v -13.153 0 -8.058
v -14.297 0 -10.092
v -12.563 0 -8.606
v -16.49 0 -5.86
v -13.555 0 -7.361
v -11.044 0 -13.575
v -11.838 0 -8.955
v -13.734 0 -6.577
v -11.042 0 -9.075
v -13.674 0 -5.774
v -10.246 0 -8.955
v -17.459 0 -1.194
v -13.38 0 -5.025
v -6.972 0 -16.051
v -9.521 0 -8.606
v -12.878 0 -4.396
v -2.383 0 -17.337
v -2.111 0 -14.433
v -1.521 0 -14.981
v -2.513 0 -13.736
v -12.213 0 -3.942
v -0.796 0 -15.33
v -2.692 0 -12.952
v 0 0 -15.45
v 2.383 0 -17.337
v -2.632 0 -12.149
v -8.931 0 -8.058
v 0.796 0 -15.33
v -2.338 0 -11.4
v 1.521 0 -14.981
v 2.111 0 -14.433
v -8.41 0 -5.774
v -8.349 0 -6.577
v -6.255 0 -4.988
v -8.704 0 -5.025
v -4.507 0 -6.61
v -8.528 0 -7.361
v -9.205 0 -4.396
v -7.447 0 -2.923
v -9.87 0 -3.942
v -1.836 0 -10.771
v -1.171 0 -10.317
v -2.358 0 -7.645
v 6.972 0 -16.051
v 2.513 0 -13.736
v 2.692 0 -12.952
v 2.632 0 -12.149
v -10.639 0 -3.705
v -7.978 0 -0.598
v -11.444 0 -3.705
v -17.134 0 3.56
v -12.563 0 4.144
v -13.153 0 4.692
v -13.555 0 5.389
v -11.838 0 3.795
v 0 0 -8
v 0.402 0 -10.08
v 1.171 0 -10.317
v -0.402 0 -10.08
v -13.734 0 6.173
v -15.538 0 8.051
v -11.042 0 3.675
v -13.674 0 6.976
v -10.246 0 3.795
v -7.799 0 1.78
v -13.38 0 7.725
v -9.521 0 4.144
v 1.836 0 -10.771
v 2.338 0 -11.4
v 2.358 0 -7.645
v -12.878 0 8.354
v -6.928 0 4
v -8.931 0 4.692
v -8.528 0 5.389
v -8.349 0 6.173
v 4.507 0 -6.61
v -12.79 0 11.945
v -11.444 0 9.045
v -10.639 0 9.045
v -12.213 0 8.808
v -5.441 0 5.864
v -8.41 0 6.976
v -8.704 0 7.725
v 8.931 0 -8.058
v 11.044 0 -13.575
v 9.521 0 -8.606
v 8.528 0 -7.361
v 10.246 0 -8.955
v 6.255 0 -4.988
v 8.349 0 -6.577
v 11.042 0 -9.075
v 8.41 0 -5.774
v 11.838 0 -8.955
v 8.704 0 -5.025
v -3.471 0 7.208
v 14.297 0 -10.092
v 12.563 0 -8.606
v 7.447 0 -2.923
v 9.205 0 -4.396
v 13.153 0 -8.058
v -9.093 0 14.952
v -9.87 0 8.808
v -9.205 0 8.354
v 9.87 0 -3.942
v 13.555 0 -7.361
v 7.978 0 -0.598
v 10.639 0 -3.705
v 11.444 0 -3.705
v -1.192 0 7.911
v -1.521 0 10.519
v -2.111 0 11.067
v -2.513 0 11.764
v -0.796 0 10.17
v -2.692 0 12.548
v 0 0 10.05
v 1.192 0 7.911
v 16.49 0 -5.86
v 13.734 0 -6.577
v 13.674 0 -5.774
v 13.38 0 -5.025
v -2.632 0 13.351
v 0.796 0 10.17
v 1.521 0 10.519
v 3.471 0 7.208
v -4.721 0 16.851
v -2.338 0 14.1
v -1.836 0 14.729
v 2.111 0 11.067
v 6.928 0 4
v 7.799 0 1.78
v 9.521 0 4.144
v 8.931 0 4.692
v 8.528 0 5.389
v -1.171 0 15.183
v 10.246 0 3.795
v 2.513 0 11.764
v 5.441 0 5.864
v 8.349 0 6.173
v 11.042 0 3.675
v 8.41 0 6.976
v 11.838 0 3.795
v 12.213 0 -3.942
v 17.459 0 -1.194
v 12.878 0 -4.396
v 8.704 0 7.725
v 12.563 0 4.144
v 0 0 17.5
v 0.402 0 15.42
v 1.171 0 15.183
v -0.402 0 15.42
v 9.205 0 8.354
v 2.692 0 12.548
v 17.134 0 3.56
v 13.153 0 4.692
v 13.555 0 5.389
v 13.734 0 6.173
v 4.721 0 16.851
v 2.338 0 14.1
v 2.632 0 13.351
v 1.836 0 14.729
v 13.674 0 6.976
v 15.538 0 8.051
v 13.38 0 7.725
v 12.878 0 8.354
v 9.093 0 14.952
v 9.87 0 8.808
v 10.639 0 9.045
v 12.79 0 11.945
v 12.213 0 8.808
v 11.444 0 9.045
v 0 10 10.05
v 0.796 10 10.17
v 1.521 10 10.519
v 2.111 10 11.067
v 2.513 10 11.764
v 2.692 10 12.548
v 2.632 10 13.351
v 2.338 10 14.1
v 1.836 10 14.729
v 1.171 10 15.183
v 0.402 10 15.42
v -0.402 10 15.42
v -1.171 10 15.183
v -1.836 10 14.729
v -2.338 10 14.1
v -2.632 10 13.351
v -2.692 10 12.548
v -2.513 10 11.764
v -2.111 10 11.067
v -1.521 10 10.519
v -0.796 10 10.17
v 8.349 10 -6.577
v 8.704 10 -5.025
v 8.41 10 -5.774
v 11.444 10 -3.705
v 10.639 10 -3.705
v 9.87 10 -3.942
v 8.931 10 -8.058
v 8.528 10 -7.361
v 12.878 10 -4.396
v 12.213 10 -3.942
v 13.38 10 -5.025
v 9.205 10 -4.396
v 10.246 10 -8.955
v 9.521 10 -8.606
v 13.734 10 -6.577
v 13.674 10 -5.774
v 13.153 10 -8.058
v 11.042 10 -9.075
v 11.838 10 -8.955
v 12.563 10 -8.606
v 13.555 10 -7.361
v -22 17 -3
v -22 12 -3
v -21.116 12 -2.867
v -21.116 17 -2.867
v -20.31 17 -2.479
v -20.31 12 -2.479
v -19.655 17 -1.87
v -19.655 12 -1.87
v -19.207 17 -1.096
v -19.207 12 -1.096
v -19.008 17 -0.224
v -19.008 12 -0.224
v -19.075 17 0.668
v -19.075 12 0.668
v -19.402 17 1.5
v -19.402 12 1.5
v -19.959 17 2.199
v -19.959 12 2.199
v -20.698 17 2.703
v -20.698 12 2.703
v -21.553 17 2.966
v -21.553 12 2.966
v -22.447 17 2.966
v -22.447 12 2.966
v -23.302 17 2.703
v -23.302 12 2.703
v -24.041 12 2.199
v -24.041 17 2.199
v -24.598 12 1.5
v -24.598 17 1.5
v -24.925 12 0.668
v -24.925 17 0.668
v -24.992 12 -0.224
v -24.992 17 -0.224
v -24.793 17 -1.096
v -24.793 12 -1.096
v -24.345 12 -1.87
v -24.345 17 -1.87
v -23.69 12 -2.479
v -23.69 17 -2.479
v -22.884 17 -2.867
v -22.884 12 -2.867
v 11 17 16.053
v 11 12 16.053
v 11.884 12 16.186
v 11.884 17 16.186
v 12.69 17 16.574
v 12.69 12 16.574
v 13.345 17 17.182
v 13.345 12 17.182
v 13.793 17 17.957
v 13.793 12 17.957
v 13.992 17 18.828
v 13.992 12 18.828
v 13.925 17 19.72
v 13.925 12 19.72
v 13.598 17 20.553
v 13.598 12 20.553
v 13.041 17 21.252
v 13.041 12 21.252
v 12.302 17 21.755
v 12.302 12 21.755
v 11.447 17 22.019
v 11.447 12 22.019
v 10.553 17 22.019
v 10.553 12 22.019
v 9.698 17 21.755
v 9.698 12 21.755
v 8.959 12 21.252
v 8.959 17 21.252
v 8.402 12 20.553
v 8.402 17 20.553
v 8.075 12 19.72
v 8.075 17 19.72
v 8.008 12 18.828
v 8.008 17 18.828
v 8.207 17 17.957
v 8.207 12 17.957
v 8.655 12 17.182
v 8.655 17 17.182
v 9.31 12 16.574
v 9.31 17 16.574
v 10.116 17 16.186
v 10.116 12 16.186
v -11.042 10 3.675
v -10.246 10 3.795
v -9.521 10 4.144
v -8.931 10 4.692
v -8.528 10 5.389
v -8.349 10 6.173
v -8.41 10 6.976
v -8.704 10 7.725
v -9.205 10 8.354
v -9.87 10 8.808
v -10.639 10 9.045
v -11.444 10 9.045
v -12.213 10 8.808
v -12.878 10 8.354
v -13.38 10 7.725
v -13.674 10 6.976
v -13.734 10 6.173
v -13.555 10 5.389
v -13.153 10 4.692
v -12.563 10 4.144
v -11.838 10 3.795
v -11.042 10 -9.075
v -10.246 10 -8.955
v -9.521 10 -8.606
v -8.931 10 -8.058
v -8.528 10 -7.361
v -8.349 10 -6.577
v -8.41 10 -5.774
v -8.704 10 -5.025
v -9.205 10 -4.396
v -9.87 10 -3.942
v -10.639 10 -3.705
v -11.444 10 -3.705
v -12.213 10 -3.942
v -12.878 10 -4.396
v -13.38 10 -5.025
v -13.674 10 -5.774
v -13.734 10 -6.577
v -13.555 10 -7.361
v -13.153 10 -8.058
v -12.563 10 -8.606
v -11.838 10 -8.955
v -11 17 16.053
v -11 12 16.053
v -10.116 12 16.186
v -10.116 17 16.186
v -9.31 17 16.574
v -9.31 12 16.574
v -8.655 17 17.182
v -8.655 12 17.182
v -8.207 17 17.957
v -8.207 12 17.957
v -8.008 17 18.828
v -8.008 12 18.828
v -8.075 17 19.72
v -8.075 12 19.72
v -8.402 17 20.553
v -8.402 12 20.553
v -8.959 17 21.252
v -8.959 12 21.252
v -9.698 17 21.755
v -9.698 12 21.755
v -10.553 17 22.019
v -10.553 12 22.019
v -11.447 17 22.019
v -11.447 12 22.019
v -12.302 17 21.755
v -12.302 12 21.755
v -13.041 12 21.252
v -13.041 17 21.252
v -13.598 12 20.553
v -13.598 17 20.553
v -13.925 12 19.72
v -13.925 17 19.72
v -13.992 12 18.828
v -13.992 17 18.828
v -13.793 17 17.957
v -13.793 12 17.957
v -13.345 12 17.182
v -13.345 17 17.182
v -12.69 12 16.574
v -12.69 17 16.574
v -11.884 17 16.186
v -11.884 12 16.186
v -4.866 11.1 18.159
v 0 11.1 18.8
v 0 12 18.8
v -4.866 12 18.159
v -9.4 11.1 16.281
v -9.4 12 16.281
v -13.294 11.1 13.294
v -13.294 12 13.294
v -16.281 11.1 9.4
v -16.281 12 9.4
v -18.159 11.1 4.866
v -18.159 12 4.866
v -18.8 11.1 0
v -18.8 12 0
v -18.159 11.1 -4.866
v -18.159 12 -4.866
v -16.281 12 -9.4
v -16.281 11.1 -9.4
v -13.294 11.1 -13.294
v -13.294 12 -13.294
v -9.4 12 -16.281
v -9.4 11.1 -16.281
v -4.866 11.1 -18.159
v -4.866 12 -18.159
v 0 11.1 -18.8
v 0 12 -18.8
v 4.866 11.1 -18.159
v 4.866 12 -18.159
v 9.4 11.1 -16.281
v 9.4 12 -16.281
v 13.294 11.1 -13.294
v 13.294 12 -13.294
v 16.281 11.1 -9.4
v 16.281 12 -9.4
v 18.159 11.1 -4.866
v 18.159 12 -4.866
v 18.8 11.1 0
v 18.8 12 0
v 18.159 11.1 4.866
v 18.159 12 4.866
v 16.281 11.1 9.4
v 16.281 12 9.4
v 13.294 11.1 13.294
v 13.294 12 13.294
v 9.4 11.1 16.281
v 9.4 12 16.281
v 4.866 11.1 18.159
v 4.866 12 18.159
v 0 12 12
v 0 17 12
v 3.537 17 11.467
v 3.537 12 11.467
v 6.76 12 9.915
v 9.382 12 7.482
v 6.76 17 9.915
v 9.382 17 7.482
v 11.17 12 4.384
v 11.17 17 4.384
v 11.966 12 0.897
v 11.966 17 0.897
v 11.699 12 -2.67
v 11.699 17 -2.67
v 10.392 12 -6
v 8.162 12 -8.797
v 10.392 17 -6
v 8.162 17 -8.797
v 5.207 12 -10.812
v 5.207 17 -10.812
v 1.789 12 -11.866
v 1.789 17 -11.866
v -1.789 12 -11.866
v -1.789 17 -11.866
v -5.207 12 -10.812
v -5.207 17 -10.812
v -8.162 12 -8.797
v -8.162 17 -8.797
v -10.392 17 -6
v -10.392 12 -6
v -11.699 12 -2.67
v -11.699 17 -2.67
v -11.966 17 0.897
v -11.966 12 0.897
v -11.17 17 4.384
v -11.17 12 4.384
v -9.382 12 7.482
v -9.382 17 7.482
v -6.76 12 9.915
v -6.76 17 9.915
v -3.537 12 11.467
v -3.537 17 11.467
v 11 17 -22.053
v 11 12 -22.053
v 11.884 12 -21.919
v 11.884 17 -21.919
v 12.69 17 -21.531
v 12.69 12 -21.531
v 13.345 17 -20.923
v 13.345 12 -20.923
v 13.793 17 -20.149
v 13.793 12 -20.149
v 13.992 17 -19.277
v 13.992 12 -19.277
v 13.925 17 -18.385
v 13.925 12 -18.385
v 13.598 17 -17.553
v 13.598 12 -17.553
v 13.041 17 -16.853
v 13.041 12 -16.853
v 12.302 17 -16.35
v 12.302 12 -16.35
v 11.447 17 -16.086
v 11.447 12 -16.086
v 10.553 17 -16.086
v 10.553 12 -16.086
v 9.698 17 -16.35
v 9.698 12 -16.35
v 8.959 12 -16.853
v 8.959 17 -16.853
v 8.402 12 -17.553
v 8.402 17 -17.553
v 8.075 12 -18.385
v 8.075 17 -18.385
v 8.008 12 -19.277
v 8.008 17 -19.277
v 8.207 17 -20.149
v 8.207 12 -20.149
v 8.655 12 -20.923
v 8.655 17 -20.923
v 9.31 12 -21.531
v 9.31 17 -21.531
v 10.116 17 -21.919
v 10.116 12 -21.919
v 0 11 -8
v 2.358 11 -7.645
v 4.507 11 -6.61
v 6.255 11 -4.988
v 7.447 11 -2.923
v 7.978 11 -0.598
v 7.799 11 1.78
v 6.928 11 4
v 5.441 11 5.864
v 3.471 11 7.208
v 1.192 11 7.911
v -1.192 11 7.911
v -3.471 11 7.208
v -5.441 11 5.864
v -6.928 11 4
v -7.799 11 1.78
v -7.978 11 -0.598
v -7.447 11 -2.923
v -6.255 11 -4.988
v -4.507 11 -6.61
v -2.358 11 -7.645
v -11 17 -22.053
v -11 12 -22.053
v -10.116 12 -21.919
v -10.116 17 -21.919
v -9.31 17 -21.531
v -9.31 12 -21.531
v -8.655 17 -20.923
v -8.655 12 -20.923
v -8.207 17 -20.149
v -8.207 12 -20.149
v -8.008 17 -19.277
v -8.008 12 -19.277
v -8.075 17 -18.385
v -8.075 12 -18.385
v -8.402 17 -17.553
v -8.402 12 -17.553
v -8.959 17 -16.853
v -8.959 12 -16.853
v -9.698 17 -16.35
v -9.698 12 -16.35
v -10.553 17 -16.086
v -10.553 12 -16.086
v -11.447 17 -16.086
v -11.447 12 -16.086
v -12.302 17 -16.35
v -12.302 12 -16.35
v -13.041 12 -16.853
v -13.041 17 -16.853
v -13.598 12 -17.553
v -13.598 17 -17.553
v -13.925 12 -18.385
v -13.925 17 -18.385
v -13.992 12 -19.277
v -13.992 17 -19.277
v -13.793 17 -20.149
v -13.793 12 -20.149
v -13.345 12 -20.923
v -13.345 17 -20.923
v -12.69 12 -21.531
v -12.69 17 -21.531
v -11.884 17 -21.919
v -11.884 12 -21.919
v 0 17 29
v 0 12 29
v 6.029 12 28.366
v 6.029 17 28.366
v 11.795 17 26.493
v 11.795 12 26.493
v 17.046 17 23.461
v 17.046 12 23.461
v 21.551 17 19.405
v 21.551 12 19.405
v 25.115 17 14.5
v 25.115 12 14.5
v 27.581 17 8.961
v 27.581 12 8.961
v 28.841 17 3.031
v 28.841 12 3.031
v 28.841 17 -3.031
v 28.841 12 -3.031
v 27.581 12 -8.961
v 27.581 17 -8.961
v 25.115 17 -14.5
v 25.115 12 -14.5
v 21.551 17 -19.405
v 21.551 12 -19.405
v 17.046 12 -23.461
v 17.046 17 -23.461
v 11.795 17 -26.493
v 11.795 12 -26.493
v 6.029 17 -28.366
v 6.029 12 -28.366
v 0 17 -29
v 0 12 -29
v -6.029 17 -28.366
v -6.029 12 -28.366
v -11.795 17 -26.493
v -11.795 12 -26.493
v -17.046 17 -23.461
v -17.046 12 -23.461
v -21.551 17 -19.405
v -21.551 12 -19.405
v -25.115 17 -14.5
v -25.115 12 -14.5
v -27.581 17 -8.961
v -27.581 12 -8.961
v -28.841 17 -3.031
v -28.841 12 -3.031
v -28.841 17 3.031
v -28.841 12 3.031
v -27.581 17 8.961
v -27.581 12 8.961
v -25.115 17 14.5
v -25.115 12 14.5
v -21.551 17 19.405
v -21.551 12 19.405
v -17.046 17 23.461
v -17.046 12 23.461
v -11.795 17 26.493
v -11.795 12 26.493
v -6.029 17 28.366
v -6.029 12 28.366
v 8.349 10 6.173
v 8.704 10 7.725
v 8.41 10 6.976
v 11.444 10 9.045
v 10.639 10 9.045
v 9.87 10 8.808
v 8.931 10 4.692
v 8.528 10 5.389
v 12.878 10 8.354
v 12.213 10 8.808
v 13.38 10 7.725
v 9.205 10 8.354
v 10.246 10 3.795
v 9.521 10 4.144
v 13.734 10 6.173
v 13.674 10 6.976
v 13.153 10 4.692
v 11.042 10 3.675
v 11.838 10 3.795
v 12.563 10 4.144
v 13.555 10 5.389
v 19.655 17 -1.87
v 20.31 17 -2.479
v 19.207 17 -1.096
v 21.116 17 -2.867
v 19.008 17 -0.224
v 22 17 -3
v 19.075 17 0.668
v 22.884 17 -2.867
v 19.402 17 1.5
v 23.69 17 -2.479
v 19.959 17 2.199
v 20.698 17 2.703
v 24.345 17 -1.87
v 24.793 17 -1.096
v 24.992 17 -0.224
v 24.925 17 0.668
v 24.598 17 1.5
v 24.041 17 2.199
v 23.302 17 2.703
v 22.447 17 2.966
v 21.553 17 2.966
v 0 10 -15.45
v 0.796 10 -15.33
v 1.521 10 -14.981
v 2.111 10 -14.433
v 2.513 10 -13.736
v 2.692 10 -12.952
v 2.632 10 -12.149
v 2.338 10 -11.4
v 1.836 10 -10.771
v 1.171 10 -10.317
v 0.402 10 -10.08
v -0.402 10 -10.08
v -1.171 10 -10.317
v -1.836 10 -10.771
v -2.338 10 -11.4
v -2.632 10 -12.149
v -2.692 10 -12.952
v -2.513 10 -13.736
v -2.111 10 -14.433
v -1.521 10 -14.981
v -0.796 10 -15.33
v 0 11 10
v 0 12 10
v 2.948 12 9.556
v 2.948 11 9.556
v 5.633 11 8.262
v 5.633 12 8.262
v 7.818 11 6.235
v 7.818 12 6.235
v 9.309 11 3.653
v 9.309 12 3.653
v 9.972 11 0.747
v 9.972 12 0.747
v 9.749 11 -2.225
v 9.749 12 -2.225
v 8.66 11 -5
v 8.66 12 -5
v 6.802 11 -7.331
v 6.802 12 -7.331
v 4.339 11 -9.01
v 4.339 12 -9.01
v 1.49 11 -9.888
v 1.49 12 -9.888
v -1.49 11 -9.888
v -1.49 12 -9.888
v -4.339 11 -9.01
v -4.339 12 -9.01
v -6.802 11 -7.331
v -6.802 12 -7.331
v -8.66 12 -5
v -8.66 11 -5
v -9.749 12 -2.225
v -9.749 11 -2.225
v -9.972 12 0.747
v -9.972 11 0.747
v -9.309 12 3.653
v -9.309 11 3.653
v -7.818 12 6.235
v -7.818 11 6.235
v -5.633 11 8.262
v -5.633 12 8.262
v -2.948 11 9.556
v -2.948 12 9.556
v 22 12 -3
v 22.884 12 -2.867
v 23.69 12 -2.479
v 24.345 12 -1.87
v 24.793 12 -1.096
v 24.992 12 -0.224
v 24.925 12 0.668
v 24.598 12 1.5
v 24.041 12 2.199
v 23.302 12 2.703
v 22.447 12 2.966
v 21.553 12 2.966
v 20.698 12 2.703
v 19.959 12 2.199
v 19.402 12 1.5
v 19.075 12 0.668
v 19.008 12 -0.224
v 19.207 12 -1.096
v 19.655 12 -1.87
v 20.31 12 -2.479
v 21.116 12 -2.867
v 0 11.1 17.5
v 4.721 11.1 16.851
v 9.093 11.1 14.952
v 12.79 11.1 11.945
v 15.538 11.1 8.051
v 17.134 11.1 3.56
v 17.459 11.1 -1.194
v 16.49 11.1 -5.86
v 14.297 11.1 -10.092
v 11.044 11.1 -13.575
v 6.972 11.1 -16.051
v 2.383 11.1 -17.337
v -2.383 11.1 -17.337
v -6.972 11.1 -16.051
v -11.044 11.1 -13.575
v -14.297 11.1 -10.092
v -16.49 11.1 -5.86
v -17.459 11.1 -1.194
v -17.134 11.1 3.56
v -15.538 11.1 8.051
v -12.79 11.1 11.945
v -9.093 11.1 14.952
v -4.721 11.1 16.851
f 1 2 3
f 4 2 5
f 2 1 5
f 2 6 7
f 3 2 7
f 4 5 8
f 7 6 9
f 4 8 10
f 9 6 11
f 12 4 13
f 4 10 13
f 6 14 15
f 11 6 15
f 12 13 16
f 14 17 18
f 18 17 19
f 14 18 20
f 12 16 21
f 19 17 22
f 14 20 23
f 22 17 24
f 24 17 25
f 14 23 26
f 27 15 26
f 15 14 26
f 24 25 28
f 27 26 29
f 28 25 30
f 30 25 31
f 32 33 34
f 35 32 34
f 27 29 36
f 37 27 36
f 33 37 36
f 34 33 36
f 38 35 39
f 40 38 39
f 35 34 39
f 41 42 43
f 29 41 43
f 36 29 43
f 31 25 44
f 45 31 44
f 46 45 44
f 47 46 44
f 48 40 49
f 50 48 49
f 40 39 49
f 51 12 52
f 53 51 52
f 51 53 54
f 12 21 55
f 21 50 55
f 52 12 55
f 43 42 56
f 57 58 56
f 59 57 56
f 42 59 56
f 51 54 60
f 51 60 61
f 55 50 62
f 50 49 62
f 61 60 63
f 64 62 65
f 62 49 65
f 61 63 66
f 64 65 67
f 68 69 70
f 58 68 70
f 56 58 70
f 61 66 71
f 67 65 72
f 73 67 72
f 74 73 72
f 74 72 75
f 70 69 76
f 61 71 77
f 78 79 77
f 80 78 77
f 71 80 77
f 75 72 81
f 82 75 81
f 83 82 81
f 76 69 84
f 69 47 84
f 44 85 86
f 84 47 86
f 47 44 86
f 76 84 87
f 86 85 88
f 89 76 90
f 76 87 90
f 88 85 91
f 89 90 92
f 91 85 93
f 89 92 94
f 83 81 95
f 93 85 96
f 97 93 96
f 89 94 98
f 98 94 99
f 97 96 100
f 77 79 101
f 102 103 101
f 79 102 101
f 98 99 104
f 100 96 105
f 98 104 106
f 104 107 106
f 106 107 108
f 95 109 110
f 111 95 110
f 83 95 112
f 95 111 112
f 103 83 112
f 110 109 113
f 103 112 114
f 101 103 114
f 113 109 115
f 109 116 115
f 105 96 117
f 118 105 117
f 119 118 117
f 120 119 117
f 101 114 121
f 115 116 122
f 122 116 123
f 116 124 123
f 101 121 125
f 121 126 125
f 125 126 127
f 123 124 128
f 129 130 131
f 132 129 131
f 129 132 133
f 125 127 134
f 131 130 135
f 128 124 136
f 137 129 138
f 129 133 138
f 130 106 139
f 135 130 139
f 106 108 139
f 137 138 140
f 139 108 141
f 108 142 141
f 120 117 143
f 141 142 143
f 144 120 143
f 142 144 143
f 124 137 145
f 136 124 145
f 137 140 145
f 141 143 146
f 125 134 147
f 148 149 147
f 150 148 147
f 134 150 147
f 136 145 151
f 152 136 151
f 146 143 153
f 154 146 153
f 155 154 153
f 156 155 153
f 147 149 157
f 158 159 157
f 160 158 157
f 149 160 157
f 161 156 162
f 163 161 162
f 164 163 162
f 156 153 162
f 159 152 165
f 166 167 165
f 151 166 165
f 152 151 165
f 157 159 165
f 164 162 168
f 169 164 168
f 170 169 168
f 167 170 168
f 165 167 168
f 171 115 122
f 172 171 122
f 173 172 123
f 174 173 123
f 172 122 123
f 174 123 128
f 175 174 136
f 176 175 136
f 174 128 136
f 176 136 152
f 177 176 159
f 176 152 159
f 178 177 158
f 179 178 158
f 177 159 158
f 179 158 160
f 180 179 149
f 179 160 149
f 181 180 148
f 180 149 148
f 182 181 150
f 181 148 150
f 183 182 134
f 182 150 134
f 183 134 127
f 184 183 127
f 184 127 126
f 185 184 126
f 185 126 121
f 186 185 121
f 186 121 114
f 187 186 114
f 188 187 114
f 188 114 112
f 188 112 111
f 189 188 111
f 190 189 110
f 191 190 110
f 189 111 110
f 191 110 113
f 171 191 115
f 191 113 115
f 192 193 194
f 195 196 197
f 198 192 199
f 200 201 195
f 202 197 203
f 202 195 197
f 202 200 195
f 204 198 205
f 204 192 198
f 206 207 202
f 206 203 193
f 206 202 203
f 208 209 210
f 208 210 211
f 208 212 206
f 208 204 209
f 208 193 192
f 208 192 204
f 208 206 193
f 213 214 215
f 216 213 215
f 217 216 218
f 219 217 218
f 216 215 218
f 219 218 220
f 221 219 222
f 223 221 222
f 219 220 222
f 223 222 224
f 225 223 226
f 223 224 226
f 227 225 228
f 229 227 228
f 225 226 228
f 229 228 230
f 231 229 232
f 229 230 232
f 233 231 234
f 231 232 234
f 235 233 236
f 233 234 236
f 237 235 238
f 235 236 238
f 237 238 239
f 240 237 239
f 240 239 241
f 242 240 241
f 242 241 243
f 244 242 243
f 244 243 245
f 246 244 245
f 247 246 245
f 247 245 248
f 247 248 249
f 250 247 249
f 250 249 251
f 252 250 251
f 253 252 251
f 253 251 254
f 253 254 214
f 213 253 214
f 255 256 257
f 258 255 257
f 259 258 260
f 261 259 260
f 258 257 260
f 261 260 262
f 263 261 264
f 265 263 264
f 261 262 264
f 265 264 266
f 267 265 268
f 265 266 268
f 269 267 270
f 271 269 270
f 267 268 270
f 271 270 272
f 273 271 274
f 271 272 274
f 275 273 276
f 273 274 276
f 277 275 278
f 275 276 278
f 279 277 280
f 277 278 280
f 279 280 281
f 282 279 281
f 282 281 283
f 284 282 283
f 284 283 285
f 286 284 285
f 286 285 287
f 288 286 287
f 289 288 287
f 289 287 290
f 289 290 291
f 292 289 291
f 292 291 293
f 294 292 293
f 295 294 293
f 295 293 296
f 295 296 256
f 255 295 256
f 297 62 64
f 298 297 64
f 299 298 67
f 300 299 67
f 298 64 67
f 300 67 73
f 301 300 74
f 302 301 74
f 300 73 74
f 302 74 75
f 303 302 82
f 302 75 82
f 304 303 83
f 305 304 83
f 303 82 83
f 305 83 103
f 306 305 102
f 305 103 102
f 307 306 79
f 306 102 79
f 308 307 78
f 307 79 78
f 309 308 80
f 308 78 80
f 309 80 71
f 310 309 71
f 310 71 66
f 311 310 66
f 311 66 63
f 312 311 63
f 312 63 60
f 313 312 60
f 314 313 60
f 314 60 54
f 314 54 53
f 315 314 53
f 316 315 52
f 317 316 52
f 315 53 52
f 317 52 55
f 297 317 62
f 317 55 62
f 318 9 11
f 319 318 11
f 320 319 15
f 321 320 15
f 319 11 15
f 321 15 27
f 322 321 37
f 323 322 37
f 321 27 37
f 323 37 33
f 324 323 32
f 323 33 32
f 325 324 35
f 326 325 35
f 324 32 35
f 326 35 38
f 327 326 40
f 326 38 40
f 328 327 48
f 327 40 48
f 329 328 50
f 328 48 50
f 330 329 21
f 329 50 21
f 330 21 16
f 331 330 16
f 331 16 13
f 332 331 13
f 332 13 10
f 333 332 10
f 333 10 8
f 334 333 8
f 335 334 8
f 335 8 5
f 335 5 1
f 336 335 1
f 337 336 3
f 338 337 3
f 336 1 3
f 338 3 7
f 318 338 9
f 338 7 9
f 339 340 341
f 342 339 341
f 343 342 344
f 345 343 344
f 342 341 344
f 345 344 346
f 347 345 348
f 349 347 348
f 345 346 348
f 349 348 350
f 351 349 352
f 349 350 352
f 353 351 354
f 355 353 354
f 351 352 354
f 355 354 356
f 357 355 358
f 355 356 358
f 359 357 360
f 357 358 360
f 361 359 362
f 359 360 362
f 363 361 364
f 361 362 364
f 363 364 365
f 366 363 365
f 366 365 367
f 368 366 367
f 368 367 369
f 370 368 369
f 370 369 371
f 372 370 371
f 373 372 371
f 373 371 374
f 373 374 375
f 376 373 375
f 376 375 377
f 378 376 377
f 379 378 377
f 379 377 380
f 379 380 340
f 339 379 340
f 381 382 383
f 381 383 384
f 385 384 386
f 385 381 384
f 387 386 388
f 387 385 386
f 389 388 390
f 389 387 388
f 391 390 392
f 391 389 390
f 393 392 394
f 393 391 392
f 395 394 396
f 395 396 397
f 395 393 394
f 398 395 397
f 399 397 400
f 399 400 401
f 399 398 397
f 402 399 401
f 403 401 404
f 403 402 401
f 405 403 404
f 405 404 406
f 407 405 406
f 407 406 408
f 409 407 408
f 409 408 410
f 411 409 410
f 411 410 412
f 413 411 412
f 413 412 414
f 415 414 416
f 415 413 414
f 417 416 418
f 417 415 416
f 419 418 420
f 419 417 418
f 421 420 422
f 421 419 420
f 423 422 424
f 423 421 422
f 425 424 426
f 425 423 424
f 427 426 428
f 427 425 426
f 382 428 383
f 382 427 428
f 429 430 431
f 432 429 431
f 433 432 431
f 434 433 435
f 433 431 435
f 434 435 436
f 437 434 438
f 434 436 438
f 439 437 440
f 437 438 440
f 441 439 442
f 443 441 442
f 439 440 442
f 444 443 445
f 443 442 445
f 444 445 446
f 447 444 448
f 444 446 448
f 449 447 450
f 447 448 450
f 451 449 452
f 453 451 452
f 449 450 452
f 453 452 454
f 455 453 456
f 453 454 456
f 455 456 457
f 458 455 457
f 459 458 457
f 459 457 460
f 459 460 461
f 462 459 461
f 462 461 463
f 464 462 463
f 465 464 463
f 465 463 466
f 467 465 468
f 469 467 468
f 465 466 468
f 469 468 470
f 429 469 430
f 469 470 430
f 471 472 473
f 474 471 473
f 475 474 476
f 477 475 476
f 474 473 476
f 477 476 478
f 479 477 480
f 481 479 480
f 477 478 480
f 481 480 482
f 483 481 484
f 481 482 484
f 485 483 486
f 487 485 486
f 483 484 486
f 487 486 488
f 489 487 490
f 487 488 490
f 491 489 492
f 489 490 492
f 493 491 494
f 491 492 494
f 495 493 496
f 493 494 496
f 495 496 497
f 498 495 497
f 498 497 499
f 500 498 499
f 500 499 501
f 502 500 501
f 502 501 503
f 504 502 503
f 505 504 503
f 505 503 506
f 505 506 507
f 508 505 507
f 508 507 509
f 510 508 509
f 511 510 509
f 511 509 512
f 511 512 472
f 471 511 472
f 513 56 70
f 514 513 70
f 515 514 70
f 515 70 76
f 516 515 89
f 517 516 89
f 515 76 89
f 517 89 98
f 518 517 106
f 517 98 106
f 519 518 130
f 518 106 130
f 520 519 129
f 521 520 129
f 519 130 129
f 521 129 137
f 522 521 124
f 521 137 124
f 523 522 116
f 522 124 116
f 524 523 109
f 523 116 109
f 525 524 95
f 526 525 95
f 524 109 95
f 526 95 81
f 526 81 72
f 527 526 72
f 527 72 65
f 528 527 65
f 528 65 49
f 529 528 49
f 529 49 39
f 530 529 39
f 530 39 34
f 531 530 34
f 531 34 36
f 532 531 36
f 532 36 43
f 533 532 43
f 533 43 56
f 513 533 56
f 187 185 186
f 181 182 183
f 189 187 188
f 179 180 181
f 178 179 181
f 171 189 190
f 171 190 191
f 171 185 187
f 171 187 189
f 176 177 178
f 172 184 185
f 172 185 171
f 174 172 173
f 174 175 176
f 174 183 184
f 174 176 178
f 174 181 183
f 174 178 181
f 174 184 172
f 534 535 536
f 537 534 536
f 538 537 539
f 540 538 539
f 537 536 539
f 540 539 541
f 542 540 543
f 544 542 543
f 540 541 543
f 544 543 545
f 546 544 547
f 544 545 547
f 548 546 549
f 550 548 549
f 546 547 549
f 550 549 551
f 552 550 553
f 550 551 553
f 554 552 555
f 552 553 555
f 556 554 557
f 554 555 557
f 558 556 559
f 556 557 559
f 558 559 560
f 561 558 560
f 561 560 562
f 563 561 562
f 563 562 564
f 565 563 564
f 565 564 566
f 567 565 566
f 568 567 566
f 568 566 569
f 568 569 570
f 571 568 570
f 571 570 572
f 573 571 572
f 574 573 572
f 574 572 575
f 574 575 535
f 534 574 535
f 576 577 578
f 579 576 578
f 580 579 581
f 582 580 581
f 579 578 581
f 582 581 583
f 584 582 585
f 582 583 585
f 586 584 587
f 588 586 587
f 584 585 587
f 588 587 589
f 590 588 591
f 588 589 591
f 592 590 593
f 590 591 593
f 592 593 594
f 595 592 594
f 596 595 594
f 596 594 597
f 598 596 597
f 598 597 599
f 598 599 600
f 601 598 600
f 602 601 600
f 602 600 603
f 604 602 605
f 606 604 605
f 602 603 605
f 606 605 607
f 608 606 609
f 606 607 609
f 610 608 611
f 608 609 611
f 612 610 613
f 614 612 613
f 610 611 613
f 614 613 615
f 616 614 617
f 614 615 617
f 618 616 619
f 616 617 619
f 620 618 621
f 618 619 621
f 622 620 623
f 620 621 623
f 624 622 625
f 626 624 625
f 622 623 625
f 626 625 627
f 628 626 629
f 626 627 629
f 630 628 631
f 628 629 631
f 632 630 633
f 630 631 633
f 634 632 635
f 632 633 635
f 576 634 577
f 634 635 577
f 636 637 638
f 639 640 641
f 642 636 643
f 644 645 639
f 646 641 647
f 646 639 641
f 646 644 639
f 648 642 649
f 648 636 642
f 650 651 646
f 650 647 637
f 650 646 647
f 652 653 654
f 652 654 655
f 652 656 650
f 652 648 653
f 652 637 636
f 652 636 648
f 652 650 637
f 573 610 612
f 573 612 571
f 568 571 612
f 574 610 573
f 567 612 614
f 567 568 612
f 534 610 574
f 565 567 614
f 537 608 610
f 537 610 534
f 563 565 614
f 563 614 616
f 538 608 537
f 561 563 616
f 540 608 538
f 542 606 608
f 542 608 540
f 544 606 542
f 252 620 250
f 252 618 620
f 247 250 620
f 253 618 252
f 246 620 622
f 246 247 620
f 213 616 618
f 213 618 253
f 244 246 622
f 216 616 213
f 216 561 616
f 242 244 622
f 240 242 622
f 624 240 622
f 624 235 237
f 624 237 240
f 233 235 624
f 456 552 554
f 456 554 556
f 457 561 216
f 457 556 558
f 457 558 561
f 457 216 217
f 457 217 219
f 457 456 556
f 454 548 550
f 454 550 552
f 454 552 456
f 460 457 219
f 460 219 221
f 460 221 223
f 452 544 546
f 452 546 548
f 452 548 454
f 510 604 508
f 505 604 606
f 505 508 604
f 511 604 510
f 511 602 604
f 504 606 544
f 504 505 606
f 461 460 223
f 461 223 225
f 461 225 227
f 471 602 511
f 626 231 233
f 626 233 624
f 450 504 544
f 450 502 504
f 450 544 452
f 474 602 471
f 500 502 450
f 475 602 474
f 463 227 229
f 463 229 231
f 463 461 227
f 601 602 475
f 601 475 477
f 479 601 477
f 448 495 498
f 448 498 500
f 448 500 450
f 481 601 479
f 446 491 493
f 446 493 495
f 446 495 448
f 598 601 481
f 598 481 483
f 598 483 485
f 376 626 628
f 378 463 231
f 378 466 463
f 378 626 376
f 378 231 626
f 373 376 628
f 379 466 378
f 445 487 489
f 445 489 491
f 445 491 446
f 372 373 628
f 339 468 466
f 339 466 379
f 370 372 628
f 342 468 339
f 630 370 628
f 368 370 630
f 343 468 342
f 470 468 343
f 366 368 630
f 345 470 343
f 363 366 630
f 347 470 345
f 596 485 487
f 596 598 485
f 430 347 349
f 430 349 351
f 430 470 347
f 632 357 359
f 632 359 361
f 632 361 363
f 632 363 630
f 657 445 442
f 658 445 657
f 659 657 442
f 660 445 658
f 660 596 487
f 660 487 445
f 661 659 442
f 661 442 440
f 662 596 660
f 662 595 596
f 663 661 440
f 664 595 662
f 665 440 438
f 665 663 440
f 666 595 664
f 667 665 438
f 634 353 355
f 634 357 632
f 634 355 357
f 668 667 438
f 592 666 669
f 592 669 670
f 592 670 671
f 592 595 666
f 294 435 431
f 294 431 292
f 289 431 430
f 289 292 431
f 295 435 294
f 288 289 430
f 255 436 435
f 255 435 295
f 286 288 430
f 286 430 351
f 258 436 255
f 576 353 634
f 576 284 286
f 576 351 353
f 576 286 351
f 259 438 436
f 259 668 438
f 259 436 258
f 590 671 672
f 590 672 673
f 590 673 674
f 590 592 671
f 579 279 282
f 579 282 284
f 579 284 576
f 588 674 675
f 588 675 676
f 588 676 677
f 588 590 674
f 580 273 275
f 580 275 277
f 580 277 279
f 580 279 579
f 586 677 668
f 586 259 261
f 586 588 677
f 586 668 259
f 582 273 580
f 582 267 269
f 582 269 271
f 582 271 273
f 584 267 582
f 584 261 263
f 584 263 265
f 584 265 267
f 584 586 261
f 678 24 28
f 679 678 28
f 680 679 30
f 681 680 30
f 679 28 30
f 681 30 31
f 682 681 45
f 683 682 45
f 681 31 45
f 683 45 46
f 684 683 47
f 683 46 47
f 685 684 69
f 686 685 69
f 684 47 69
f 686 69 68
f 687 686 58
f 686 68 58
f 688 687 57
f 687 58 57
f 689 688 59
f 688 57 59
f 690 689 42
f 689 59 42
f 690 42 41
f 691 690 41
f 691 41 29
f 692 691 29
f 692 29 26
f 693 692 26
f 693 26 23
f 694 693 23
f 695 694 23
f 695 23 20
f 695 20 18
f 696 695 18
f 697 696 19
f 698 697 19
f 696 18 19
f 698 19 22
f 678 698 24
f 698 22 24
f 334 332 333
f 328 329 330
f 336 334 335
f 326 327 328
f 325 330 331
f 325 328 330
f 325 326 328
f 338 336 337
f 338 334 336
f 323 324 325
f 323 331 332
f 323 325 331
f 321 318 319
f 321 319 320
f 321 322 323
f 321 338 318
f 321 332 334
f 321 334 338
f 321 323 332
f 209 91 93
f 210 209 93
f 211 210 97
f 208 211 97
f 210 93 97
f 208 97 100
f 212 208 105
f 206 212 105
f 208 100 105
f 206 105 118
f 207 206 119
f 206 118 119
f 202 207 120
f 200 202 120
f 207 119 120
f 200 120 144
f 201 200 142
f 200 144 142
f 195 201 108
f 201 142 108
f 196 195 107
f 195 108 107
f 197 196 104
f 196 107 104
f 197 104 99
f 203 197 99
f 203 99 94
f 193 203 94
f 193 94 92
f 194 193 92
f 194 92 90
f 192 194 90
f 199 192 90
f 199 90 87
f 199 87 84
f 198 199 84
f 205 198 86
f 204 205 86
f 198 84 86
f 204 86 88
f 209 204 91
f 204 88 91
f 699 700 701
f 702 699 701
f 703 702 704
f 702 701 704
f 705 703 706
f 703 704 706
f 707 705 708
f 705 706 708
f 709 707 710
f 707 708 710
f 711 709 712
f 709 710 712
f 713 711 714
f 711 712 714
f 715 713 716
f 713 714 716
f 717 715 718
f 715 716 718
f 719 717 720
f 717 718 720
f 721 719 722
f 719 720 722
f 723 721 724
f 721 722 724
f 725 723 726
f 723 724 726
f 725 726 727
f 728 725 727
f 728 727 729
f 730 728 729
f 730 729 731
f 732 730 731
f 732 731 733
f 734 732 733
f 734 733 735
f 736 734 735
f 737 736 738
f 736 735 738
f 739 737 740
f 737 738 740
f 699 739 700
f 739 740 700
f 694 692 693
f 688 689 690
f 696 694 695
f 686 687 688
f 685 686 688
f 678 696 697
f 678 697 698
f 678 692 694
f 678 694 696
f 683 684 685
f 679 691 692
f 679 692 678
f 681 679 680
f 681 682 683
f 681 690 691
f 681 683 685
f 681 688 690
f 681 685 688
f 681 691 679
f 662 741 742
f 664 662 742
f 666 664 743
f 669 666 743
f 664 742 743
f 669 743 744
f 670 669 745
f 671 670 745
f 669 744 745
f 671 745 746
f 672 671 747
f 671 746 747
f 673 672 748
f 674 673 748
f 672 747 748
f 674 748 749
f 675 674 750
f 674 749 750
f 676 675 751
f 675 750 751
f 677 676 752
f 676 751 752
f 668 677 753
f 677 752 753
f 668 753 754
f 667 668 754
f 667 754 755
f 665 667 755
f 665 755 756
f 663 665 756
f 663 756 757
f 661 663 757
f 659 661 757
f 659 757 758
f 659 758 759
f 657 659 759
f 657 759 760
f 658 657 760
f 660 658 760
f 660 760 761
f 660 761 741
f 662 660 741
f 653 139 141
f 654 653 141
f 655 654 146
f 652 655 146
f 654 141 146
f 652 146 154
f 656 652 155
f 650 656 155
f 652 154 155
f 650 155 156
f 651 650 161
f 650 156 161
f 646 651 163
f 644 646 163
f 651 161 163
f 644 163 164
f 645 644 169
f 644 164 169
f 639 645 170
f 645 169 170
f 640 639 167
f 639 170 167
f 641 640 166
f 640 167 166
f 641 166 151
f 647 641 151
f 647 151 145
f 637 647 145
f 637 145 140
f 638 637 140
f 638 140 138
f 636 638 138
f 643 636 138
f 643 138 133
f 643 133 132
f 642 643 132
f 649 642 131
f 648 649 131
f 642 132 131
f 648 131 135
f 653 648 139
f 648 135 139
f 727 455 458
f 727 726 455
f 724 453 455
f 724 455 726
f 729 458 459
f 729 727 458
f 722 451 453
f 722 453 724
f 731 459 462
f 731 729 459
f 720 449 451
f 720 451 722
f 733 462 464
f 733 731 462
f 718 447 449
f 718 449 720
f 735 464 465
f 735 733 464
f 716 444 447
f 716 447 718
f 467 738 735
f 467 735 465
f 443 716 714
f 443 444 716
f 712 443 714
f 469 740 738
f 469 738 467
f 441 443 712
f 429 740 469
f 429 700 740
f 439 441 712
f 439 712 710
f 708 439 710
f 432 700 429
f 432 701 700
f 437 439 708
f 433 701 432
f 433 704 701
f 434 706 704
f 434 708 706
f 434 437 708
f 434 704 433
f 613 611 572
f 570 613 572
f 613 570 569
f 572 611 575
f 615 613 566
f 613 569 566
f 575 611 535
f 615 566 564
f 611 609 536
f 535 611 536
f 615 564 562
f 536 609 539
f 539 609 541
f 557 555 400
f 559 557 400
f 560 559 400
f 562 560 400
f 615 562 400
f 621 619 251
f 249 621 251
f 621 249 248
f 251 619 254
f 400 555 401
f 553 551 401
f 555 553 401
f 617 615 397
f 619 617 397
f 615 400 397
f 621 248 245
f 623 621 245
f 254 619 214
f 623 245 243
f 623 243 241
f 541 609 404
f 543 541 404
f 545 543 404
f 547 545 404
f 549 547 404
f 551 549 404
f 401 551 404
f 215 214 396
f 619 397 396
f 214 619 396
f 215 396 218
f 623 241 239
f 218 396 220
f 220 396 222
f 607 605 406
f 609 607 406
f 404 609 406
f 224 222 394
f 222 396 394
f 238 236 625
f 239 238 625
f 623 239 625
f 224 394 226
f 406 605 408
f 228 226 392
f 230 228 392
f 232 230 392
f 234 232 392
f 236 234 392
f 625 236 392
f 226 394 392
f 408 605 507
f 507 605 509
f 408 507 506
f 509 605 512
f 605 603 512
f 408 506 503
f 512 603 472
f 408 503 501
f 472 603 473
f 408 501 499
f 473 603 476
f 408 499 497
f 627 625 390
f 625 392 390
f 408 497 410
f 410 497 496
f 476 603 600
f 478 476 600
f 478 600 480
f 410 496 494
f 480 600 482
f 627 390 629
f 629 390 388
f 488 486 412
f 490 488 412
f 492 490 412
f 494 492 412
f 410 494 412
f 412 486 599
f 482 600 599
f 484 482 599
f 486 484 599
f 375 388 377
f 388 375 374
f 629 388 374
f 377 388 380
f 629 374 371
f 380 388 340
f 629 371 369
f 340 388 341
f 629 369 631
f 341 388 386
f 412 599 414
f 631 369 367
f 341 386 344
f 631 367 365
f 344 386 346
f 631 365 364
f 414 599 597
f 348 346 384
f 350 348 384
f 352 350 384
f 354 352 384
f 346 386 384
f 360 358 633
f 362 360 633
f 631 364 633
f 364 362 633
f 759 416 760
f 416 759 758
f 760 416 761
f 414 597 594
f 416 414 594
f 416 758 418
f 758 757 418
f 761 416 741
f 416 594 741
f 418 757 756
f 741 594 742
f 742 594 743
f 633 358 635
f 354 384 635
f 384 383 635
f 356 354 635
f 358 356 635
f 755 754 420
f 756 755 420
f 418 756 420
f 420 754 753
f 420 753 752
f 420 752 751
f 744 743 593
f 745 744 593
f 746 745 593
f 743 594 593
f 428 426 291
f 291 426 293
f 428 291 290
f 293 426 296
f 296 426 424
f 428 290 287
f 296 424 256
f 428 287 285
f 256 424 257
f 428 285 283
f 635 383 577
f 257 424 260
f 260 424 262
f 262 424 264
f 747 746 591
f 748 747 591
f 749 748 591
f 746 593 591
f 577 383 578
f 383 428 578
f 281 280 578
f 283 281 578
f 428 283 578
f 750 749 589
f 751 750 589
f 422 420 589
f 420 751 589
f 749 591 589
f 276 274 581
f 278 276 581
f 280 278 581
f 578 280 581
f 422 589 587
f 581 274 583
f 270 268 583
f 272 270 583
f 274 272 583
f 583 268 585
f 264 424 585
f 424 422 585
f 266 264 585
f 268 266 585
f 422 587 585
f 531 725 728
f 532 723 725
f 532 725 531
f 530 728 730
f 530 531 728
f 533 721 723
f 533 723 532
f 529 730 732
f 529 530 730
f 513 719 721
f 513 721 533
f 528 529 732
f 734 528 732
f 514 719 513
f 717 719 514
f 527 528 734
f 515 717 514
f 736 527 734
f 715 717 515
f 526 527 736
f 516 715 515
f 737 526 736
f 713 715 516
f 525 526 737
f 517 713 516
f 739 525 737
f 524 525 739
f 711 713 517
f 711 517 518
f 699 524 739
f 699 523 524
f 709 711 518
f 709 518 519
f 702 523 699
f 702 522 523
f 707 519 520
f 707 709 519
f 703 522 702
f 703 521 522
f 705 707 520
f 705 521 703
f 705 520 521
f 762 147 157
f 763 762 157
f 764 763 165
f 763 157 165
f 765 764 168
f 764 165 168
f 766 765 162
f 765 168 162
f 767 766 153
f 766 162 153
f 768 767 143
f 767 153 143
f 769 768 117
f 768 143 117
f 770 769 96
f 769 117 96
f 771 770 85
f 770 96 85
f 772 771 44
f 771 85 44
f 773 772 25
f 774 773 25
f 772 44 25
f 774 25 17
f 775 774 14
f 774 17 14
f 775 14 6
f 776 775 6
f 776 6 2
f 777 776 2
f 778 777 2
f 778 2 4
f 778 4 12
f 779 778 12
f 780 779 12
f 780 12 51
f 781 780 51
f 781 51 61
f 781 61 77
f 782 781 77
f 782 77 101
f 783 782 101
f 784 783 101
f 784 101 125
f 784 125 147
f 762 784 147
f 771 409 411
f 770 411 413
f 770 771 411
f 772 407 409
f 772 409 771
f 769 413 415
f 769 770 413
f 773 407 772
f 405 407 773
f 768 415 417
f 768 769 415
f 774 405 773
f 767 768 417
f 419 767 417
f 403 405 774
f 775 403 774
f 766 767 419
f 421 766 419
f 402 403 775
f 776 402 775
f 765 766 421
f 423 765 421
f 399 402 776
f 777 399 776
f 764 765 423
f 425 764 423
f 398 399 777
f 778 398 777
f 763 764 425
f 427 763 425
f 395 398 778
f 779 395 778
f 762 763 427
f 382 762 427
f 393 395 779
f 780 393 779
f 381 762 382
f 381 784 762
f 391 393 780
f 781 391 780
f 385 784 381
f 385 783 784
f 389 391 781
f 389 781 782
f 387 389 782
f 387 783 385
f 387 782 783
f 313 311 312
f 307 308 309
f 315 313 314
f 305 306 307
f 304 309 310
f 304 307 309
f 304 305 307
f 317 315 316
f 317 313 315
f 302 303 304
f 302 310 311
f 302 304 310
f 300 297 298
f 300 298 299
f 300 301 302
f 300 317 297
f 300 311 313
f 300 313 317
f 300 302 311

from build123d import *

# Parameters (mm, degrees)
SKETCH1_R           = 17.5
BOSS_EXTRUDE1_DEPTH = 12
SKETCH2_R           = 29
BOSS_EXTRUDE2_DEPTH = 5
SKETCH3_R           = 12
CUT_EXTRUDE1_DEPTH  = 5
SKETCH4_R           = 10
CUT_EXTRUDE2_DEPTH  = 1
CUT_EXTRUDE3_REACH  = 44.732
SKETCH5_R           = 3
BOSS_EXTRUDE3_START = 0.9
SKETCH6_R           = 18.8
SKETCH6_R_2         = 17.5
BOSS_EXTRUDE3_DEPTH = 0.9
CUT_EXTRUDE4_REACH  = 46.396
SKETCH7_R           = 8
SKETCH9_R           = 2.7
CUT_EXTRUDE5_DEPTH  = 10


with BuildPart() as part:
    # Sketch1 → Boss-Extrude1 (new body)
    with BuildSketch(Plane(origin=(0, 0, 0), x_dir=(1, 0, 0), z_dir=(0, 1, 0))):
        with Locations(Location((0, 0, 0), (0, 0, 270))):
            Circle(SKETCH1_R)
    extrude(amount=BOSS_EXTRUDE1_DEPTH)

    # Sketch2 → Boss-Extrude2 (add)
    with BuildSketch(Plane(origin=(0, 12, 0), x_dir=(1, 0, 0), z_dir=(0, 1, 0))):
        with Locations(Location((0, 0, 0), (0, 0, 270))):
            Circle(SKETCH2_R)
    extrude(amount=BOSS_EXTRUDE2_DEPTH)

    # Sketch3 → Cut-Extrude1 (cut)
    with BuildSketch(Plane(origin=(0, 17, 0), x_dir=(1, 0, 0), z_dir=(0, 1, 0))):
        with Locations(Location((0, 0, 0), (0, 0, 270))):
            Circle(SKETCH3_R)
    extrude(amount=-CUT_EXTRUDE1_DEPTH, mode=Mode.SUBTRACT)

    # Sketch4 → Cut-Extrude2 (cut)
    with BuildSketch(Plane(origin=(0, 12, 0), x_dir=(1, 0, 0), z_dir=(0, 1, 0))):
        with Locations(Location((0, 0, 0), (0, 0, 270))):
            Circle(SKETCH4_R)
    extrude(amount=-CUT_EXTRUDE2_DEPTH, mode=Mode.SUBTRACT)

    # Sketch5 → Cut-Extrude3 (cut, up to next)
    with BuildSketch(Plane.XZ.offset(-12), mode=Mode.PRIVATE) as cut_extrude3_sk1:
        with Locations(Location((22, 0, 0), (0, 0, 270))):
            Circle(SKETCH5_R)
    cut_extrude3_tool1 = extrude(cut_extrude3_sk1.sketch, amount=-CUT_EXTRUDE3_REACH, mode=Mode.PRIVATE) & part.part
    # Sketch5 → Cut-Extrude3 (cut, up to next)
    with BuildSketch(Plane.XZ.offset(-12), mode=Mode.PRIVATE) as cut_extrude3_sk2:
        with Locations(Location((11, -19.052558883, 0), (0, 0, 270))):
            Circle(SKETCH5_R)
    cut_extrude3_tool2 = extrude(cut_extrude3_sk2.sketch, amount=-CUT_EXTRUDE3_REACH, mode=Mode.PRIVATE) & part.part
    # Sketch5 → Cut-Extrude3 (cut, up to next)
    with BuildSketch(Plane.XZ.offset(-12), mode=Mode.PRIVATE) as cut_extrude3_sk3:
        with Locations(Location((-11, -19.052558883, 0), (0, 0, 270))):
            Circle(SKETCH5_R)
    cut_extrude3_tool3 = extrude(cut_extrude3_sk3.sketch, amount=-CUT_EXTRUDE3_REACH, mode=Mode.PRIVATE) & part.part
    # Sketch5 → Cut-Extrude3 (cut, up to next)
    with BuildSketch(Plane.XZ.offset(-12), mode=Mode.PRIVATE) as cut_extrude3_sk4:
        with Locations(Location((-22, 0, 0), (0, 0, 270))):
            Circle(SKETCH5_R)
    cut_extrude3_tool4 = extrude(cut_extrude3_sk4.sketch, amount=-CUT_EXTRUDE3_REACH, mode=Mode.PRIVATE) & part.part
    # Sketch5 → Cut-Extrude3 (cut, up to next)
    with BuildSketch(Plane.XZ.offset(-12), mode=Mode.PRIVATE) as cut_extrude3_sk5:
        with Locations(Location((-11, 19.052558883, 0), (0, 0, 270))):
            Circle(SKETCH5_R)
    cut_extrude3_tool5 = extrude(cut_extrude3_sk5.sketch, amount=-CUT_EXTRUDE3_REACH, mode=Mode.PRIVATE) & part.part
    # Sketch5 → Cut-Extrude3 (cut, up to next)
    with BuildSketch(Plane.XZ.offset(-12), mode=Mode.PRIVATE) as cut_extrude3_sk6:
        with Locations(Location((11, 19.052558883, 0), (0, 0, 270))):
            Circle(SKETCH5_R)
    cut_extrude3_tool6 = extrude(cut_extrude3_sk6.sketch, amount=-CUT_EXTRUDE3_REACH, mode=Mode.PRIVATE) & part.part
    add(cut_extrude3_tool1.solids().sort_by_distance((22, 12, 0))[0], mode=Mode.SUBTRACT)
    add(cut_extrude3_tool2.solids().sort_by_distance((11, 12, -19.052559))[0], mode=Mode.SUBTRACT)
    add(cut_extrude3_tool3.solids().sort_by_distance((-11, 12, -19.052559))[0], mode=Mode.SUBTRACT)
    add(cut_extrude3_tool4.solids().sort_by_distance((-22, 12, 0))[0], mode=Mode.SUBTRACT)
    add(cut_extrude3_tool5.solids().sort_by_distance((-11, 12, 19.052559))[0], mode=Mode.SUBTRACT)
    add(cut_extrude3_tool6.solids().sort_by_distance((11, 12, 19.052559))[0], mode=Mode.SUBTRACT)

    # Sketch6 → Boss-Extrude3 (add)
    with BuildSketch(Plane.XZ.offset(-12).offset(BOSS_EXTRUDE3_START)):
        with Locations(Location((0, 0, 0), (0, 0, 90))):
            Circle(SKETCH6_R)
        with Locations(Location((0, 0, 0), (0, 0, 270))):
            Circle(SKETCH6_R_2, mode=Mode.SUBTRACT)
    extrude(amount=-BOSS_EXTRUDE3_DEPTH)

    # Sketch7 → Cut-Extrude4 (cut, up to next)
    with BuildSketch(Plane.XZ, mode=Mode.PRIVATE) as cut_extrude4_sk1:
        with Locations(Location((0, 0, 0), (0, 0, 270))):
            Circle(SKETCH7_R)
    cut_extrude4_tool1 = extrude(cut_extrude4_sk1.sketch, amount=-CUT_EXTRUDE4_REACH, mode=Mode.PRIVATE) & part.part
    add(cut_extrude4_tool1.solids().sort_by_distance((0, 0, 0))[0], mode=Mode.SUBTRACT)

    # Sketch9 → Cut-Extrude5 (cut)
    with BuildSketch(Plane.XZ):
        with Locations(Location((0, 12.75, 0), (0, 0, 270))):
            Circle(SKETCH9_R)
        with Locations(Location((11.041823898, 6.375, 0), (0, 0, 270))):
            Circle(SKETCH9_R)
        with Locations(Location((11.041823898, -6.375, 0), (0, 0, 270))):
            Circle(SKETCH9_R)
        with Locations(Location((0, -12.75, 0), (0, 0, 270))):
            Circle(SKETCH9_R)
        with Locations(Location((-11.041823898, -6.375, 0), (0, 0, 270))):
            Circle(SKETCH9_R)
        with Locations(Location((-11.041823898, 6.375, 0), (0, 0, 270))):
            Circle(SKETCH9_R)
    extrude(amount=-CUT_EXTRUDE5_DEPTH, mode=Mode.SUBTRACT)


solid = part.part
